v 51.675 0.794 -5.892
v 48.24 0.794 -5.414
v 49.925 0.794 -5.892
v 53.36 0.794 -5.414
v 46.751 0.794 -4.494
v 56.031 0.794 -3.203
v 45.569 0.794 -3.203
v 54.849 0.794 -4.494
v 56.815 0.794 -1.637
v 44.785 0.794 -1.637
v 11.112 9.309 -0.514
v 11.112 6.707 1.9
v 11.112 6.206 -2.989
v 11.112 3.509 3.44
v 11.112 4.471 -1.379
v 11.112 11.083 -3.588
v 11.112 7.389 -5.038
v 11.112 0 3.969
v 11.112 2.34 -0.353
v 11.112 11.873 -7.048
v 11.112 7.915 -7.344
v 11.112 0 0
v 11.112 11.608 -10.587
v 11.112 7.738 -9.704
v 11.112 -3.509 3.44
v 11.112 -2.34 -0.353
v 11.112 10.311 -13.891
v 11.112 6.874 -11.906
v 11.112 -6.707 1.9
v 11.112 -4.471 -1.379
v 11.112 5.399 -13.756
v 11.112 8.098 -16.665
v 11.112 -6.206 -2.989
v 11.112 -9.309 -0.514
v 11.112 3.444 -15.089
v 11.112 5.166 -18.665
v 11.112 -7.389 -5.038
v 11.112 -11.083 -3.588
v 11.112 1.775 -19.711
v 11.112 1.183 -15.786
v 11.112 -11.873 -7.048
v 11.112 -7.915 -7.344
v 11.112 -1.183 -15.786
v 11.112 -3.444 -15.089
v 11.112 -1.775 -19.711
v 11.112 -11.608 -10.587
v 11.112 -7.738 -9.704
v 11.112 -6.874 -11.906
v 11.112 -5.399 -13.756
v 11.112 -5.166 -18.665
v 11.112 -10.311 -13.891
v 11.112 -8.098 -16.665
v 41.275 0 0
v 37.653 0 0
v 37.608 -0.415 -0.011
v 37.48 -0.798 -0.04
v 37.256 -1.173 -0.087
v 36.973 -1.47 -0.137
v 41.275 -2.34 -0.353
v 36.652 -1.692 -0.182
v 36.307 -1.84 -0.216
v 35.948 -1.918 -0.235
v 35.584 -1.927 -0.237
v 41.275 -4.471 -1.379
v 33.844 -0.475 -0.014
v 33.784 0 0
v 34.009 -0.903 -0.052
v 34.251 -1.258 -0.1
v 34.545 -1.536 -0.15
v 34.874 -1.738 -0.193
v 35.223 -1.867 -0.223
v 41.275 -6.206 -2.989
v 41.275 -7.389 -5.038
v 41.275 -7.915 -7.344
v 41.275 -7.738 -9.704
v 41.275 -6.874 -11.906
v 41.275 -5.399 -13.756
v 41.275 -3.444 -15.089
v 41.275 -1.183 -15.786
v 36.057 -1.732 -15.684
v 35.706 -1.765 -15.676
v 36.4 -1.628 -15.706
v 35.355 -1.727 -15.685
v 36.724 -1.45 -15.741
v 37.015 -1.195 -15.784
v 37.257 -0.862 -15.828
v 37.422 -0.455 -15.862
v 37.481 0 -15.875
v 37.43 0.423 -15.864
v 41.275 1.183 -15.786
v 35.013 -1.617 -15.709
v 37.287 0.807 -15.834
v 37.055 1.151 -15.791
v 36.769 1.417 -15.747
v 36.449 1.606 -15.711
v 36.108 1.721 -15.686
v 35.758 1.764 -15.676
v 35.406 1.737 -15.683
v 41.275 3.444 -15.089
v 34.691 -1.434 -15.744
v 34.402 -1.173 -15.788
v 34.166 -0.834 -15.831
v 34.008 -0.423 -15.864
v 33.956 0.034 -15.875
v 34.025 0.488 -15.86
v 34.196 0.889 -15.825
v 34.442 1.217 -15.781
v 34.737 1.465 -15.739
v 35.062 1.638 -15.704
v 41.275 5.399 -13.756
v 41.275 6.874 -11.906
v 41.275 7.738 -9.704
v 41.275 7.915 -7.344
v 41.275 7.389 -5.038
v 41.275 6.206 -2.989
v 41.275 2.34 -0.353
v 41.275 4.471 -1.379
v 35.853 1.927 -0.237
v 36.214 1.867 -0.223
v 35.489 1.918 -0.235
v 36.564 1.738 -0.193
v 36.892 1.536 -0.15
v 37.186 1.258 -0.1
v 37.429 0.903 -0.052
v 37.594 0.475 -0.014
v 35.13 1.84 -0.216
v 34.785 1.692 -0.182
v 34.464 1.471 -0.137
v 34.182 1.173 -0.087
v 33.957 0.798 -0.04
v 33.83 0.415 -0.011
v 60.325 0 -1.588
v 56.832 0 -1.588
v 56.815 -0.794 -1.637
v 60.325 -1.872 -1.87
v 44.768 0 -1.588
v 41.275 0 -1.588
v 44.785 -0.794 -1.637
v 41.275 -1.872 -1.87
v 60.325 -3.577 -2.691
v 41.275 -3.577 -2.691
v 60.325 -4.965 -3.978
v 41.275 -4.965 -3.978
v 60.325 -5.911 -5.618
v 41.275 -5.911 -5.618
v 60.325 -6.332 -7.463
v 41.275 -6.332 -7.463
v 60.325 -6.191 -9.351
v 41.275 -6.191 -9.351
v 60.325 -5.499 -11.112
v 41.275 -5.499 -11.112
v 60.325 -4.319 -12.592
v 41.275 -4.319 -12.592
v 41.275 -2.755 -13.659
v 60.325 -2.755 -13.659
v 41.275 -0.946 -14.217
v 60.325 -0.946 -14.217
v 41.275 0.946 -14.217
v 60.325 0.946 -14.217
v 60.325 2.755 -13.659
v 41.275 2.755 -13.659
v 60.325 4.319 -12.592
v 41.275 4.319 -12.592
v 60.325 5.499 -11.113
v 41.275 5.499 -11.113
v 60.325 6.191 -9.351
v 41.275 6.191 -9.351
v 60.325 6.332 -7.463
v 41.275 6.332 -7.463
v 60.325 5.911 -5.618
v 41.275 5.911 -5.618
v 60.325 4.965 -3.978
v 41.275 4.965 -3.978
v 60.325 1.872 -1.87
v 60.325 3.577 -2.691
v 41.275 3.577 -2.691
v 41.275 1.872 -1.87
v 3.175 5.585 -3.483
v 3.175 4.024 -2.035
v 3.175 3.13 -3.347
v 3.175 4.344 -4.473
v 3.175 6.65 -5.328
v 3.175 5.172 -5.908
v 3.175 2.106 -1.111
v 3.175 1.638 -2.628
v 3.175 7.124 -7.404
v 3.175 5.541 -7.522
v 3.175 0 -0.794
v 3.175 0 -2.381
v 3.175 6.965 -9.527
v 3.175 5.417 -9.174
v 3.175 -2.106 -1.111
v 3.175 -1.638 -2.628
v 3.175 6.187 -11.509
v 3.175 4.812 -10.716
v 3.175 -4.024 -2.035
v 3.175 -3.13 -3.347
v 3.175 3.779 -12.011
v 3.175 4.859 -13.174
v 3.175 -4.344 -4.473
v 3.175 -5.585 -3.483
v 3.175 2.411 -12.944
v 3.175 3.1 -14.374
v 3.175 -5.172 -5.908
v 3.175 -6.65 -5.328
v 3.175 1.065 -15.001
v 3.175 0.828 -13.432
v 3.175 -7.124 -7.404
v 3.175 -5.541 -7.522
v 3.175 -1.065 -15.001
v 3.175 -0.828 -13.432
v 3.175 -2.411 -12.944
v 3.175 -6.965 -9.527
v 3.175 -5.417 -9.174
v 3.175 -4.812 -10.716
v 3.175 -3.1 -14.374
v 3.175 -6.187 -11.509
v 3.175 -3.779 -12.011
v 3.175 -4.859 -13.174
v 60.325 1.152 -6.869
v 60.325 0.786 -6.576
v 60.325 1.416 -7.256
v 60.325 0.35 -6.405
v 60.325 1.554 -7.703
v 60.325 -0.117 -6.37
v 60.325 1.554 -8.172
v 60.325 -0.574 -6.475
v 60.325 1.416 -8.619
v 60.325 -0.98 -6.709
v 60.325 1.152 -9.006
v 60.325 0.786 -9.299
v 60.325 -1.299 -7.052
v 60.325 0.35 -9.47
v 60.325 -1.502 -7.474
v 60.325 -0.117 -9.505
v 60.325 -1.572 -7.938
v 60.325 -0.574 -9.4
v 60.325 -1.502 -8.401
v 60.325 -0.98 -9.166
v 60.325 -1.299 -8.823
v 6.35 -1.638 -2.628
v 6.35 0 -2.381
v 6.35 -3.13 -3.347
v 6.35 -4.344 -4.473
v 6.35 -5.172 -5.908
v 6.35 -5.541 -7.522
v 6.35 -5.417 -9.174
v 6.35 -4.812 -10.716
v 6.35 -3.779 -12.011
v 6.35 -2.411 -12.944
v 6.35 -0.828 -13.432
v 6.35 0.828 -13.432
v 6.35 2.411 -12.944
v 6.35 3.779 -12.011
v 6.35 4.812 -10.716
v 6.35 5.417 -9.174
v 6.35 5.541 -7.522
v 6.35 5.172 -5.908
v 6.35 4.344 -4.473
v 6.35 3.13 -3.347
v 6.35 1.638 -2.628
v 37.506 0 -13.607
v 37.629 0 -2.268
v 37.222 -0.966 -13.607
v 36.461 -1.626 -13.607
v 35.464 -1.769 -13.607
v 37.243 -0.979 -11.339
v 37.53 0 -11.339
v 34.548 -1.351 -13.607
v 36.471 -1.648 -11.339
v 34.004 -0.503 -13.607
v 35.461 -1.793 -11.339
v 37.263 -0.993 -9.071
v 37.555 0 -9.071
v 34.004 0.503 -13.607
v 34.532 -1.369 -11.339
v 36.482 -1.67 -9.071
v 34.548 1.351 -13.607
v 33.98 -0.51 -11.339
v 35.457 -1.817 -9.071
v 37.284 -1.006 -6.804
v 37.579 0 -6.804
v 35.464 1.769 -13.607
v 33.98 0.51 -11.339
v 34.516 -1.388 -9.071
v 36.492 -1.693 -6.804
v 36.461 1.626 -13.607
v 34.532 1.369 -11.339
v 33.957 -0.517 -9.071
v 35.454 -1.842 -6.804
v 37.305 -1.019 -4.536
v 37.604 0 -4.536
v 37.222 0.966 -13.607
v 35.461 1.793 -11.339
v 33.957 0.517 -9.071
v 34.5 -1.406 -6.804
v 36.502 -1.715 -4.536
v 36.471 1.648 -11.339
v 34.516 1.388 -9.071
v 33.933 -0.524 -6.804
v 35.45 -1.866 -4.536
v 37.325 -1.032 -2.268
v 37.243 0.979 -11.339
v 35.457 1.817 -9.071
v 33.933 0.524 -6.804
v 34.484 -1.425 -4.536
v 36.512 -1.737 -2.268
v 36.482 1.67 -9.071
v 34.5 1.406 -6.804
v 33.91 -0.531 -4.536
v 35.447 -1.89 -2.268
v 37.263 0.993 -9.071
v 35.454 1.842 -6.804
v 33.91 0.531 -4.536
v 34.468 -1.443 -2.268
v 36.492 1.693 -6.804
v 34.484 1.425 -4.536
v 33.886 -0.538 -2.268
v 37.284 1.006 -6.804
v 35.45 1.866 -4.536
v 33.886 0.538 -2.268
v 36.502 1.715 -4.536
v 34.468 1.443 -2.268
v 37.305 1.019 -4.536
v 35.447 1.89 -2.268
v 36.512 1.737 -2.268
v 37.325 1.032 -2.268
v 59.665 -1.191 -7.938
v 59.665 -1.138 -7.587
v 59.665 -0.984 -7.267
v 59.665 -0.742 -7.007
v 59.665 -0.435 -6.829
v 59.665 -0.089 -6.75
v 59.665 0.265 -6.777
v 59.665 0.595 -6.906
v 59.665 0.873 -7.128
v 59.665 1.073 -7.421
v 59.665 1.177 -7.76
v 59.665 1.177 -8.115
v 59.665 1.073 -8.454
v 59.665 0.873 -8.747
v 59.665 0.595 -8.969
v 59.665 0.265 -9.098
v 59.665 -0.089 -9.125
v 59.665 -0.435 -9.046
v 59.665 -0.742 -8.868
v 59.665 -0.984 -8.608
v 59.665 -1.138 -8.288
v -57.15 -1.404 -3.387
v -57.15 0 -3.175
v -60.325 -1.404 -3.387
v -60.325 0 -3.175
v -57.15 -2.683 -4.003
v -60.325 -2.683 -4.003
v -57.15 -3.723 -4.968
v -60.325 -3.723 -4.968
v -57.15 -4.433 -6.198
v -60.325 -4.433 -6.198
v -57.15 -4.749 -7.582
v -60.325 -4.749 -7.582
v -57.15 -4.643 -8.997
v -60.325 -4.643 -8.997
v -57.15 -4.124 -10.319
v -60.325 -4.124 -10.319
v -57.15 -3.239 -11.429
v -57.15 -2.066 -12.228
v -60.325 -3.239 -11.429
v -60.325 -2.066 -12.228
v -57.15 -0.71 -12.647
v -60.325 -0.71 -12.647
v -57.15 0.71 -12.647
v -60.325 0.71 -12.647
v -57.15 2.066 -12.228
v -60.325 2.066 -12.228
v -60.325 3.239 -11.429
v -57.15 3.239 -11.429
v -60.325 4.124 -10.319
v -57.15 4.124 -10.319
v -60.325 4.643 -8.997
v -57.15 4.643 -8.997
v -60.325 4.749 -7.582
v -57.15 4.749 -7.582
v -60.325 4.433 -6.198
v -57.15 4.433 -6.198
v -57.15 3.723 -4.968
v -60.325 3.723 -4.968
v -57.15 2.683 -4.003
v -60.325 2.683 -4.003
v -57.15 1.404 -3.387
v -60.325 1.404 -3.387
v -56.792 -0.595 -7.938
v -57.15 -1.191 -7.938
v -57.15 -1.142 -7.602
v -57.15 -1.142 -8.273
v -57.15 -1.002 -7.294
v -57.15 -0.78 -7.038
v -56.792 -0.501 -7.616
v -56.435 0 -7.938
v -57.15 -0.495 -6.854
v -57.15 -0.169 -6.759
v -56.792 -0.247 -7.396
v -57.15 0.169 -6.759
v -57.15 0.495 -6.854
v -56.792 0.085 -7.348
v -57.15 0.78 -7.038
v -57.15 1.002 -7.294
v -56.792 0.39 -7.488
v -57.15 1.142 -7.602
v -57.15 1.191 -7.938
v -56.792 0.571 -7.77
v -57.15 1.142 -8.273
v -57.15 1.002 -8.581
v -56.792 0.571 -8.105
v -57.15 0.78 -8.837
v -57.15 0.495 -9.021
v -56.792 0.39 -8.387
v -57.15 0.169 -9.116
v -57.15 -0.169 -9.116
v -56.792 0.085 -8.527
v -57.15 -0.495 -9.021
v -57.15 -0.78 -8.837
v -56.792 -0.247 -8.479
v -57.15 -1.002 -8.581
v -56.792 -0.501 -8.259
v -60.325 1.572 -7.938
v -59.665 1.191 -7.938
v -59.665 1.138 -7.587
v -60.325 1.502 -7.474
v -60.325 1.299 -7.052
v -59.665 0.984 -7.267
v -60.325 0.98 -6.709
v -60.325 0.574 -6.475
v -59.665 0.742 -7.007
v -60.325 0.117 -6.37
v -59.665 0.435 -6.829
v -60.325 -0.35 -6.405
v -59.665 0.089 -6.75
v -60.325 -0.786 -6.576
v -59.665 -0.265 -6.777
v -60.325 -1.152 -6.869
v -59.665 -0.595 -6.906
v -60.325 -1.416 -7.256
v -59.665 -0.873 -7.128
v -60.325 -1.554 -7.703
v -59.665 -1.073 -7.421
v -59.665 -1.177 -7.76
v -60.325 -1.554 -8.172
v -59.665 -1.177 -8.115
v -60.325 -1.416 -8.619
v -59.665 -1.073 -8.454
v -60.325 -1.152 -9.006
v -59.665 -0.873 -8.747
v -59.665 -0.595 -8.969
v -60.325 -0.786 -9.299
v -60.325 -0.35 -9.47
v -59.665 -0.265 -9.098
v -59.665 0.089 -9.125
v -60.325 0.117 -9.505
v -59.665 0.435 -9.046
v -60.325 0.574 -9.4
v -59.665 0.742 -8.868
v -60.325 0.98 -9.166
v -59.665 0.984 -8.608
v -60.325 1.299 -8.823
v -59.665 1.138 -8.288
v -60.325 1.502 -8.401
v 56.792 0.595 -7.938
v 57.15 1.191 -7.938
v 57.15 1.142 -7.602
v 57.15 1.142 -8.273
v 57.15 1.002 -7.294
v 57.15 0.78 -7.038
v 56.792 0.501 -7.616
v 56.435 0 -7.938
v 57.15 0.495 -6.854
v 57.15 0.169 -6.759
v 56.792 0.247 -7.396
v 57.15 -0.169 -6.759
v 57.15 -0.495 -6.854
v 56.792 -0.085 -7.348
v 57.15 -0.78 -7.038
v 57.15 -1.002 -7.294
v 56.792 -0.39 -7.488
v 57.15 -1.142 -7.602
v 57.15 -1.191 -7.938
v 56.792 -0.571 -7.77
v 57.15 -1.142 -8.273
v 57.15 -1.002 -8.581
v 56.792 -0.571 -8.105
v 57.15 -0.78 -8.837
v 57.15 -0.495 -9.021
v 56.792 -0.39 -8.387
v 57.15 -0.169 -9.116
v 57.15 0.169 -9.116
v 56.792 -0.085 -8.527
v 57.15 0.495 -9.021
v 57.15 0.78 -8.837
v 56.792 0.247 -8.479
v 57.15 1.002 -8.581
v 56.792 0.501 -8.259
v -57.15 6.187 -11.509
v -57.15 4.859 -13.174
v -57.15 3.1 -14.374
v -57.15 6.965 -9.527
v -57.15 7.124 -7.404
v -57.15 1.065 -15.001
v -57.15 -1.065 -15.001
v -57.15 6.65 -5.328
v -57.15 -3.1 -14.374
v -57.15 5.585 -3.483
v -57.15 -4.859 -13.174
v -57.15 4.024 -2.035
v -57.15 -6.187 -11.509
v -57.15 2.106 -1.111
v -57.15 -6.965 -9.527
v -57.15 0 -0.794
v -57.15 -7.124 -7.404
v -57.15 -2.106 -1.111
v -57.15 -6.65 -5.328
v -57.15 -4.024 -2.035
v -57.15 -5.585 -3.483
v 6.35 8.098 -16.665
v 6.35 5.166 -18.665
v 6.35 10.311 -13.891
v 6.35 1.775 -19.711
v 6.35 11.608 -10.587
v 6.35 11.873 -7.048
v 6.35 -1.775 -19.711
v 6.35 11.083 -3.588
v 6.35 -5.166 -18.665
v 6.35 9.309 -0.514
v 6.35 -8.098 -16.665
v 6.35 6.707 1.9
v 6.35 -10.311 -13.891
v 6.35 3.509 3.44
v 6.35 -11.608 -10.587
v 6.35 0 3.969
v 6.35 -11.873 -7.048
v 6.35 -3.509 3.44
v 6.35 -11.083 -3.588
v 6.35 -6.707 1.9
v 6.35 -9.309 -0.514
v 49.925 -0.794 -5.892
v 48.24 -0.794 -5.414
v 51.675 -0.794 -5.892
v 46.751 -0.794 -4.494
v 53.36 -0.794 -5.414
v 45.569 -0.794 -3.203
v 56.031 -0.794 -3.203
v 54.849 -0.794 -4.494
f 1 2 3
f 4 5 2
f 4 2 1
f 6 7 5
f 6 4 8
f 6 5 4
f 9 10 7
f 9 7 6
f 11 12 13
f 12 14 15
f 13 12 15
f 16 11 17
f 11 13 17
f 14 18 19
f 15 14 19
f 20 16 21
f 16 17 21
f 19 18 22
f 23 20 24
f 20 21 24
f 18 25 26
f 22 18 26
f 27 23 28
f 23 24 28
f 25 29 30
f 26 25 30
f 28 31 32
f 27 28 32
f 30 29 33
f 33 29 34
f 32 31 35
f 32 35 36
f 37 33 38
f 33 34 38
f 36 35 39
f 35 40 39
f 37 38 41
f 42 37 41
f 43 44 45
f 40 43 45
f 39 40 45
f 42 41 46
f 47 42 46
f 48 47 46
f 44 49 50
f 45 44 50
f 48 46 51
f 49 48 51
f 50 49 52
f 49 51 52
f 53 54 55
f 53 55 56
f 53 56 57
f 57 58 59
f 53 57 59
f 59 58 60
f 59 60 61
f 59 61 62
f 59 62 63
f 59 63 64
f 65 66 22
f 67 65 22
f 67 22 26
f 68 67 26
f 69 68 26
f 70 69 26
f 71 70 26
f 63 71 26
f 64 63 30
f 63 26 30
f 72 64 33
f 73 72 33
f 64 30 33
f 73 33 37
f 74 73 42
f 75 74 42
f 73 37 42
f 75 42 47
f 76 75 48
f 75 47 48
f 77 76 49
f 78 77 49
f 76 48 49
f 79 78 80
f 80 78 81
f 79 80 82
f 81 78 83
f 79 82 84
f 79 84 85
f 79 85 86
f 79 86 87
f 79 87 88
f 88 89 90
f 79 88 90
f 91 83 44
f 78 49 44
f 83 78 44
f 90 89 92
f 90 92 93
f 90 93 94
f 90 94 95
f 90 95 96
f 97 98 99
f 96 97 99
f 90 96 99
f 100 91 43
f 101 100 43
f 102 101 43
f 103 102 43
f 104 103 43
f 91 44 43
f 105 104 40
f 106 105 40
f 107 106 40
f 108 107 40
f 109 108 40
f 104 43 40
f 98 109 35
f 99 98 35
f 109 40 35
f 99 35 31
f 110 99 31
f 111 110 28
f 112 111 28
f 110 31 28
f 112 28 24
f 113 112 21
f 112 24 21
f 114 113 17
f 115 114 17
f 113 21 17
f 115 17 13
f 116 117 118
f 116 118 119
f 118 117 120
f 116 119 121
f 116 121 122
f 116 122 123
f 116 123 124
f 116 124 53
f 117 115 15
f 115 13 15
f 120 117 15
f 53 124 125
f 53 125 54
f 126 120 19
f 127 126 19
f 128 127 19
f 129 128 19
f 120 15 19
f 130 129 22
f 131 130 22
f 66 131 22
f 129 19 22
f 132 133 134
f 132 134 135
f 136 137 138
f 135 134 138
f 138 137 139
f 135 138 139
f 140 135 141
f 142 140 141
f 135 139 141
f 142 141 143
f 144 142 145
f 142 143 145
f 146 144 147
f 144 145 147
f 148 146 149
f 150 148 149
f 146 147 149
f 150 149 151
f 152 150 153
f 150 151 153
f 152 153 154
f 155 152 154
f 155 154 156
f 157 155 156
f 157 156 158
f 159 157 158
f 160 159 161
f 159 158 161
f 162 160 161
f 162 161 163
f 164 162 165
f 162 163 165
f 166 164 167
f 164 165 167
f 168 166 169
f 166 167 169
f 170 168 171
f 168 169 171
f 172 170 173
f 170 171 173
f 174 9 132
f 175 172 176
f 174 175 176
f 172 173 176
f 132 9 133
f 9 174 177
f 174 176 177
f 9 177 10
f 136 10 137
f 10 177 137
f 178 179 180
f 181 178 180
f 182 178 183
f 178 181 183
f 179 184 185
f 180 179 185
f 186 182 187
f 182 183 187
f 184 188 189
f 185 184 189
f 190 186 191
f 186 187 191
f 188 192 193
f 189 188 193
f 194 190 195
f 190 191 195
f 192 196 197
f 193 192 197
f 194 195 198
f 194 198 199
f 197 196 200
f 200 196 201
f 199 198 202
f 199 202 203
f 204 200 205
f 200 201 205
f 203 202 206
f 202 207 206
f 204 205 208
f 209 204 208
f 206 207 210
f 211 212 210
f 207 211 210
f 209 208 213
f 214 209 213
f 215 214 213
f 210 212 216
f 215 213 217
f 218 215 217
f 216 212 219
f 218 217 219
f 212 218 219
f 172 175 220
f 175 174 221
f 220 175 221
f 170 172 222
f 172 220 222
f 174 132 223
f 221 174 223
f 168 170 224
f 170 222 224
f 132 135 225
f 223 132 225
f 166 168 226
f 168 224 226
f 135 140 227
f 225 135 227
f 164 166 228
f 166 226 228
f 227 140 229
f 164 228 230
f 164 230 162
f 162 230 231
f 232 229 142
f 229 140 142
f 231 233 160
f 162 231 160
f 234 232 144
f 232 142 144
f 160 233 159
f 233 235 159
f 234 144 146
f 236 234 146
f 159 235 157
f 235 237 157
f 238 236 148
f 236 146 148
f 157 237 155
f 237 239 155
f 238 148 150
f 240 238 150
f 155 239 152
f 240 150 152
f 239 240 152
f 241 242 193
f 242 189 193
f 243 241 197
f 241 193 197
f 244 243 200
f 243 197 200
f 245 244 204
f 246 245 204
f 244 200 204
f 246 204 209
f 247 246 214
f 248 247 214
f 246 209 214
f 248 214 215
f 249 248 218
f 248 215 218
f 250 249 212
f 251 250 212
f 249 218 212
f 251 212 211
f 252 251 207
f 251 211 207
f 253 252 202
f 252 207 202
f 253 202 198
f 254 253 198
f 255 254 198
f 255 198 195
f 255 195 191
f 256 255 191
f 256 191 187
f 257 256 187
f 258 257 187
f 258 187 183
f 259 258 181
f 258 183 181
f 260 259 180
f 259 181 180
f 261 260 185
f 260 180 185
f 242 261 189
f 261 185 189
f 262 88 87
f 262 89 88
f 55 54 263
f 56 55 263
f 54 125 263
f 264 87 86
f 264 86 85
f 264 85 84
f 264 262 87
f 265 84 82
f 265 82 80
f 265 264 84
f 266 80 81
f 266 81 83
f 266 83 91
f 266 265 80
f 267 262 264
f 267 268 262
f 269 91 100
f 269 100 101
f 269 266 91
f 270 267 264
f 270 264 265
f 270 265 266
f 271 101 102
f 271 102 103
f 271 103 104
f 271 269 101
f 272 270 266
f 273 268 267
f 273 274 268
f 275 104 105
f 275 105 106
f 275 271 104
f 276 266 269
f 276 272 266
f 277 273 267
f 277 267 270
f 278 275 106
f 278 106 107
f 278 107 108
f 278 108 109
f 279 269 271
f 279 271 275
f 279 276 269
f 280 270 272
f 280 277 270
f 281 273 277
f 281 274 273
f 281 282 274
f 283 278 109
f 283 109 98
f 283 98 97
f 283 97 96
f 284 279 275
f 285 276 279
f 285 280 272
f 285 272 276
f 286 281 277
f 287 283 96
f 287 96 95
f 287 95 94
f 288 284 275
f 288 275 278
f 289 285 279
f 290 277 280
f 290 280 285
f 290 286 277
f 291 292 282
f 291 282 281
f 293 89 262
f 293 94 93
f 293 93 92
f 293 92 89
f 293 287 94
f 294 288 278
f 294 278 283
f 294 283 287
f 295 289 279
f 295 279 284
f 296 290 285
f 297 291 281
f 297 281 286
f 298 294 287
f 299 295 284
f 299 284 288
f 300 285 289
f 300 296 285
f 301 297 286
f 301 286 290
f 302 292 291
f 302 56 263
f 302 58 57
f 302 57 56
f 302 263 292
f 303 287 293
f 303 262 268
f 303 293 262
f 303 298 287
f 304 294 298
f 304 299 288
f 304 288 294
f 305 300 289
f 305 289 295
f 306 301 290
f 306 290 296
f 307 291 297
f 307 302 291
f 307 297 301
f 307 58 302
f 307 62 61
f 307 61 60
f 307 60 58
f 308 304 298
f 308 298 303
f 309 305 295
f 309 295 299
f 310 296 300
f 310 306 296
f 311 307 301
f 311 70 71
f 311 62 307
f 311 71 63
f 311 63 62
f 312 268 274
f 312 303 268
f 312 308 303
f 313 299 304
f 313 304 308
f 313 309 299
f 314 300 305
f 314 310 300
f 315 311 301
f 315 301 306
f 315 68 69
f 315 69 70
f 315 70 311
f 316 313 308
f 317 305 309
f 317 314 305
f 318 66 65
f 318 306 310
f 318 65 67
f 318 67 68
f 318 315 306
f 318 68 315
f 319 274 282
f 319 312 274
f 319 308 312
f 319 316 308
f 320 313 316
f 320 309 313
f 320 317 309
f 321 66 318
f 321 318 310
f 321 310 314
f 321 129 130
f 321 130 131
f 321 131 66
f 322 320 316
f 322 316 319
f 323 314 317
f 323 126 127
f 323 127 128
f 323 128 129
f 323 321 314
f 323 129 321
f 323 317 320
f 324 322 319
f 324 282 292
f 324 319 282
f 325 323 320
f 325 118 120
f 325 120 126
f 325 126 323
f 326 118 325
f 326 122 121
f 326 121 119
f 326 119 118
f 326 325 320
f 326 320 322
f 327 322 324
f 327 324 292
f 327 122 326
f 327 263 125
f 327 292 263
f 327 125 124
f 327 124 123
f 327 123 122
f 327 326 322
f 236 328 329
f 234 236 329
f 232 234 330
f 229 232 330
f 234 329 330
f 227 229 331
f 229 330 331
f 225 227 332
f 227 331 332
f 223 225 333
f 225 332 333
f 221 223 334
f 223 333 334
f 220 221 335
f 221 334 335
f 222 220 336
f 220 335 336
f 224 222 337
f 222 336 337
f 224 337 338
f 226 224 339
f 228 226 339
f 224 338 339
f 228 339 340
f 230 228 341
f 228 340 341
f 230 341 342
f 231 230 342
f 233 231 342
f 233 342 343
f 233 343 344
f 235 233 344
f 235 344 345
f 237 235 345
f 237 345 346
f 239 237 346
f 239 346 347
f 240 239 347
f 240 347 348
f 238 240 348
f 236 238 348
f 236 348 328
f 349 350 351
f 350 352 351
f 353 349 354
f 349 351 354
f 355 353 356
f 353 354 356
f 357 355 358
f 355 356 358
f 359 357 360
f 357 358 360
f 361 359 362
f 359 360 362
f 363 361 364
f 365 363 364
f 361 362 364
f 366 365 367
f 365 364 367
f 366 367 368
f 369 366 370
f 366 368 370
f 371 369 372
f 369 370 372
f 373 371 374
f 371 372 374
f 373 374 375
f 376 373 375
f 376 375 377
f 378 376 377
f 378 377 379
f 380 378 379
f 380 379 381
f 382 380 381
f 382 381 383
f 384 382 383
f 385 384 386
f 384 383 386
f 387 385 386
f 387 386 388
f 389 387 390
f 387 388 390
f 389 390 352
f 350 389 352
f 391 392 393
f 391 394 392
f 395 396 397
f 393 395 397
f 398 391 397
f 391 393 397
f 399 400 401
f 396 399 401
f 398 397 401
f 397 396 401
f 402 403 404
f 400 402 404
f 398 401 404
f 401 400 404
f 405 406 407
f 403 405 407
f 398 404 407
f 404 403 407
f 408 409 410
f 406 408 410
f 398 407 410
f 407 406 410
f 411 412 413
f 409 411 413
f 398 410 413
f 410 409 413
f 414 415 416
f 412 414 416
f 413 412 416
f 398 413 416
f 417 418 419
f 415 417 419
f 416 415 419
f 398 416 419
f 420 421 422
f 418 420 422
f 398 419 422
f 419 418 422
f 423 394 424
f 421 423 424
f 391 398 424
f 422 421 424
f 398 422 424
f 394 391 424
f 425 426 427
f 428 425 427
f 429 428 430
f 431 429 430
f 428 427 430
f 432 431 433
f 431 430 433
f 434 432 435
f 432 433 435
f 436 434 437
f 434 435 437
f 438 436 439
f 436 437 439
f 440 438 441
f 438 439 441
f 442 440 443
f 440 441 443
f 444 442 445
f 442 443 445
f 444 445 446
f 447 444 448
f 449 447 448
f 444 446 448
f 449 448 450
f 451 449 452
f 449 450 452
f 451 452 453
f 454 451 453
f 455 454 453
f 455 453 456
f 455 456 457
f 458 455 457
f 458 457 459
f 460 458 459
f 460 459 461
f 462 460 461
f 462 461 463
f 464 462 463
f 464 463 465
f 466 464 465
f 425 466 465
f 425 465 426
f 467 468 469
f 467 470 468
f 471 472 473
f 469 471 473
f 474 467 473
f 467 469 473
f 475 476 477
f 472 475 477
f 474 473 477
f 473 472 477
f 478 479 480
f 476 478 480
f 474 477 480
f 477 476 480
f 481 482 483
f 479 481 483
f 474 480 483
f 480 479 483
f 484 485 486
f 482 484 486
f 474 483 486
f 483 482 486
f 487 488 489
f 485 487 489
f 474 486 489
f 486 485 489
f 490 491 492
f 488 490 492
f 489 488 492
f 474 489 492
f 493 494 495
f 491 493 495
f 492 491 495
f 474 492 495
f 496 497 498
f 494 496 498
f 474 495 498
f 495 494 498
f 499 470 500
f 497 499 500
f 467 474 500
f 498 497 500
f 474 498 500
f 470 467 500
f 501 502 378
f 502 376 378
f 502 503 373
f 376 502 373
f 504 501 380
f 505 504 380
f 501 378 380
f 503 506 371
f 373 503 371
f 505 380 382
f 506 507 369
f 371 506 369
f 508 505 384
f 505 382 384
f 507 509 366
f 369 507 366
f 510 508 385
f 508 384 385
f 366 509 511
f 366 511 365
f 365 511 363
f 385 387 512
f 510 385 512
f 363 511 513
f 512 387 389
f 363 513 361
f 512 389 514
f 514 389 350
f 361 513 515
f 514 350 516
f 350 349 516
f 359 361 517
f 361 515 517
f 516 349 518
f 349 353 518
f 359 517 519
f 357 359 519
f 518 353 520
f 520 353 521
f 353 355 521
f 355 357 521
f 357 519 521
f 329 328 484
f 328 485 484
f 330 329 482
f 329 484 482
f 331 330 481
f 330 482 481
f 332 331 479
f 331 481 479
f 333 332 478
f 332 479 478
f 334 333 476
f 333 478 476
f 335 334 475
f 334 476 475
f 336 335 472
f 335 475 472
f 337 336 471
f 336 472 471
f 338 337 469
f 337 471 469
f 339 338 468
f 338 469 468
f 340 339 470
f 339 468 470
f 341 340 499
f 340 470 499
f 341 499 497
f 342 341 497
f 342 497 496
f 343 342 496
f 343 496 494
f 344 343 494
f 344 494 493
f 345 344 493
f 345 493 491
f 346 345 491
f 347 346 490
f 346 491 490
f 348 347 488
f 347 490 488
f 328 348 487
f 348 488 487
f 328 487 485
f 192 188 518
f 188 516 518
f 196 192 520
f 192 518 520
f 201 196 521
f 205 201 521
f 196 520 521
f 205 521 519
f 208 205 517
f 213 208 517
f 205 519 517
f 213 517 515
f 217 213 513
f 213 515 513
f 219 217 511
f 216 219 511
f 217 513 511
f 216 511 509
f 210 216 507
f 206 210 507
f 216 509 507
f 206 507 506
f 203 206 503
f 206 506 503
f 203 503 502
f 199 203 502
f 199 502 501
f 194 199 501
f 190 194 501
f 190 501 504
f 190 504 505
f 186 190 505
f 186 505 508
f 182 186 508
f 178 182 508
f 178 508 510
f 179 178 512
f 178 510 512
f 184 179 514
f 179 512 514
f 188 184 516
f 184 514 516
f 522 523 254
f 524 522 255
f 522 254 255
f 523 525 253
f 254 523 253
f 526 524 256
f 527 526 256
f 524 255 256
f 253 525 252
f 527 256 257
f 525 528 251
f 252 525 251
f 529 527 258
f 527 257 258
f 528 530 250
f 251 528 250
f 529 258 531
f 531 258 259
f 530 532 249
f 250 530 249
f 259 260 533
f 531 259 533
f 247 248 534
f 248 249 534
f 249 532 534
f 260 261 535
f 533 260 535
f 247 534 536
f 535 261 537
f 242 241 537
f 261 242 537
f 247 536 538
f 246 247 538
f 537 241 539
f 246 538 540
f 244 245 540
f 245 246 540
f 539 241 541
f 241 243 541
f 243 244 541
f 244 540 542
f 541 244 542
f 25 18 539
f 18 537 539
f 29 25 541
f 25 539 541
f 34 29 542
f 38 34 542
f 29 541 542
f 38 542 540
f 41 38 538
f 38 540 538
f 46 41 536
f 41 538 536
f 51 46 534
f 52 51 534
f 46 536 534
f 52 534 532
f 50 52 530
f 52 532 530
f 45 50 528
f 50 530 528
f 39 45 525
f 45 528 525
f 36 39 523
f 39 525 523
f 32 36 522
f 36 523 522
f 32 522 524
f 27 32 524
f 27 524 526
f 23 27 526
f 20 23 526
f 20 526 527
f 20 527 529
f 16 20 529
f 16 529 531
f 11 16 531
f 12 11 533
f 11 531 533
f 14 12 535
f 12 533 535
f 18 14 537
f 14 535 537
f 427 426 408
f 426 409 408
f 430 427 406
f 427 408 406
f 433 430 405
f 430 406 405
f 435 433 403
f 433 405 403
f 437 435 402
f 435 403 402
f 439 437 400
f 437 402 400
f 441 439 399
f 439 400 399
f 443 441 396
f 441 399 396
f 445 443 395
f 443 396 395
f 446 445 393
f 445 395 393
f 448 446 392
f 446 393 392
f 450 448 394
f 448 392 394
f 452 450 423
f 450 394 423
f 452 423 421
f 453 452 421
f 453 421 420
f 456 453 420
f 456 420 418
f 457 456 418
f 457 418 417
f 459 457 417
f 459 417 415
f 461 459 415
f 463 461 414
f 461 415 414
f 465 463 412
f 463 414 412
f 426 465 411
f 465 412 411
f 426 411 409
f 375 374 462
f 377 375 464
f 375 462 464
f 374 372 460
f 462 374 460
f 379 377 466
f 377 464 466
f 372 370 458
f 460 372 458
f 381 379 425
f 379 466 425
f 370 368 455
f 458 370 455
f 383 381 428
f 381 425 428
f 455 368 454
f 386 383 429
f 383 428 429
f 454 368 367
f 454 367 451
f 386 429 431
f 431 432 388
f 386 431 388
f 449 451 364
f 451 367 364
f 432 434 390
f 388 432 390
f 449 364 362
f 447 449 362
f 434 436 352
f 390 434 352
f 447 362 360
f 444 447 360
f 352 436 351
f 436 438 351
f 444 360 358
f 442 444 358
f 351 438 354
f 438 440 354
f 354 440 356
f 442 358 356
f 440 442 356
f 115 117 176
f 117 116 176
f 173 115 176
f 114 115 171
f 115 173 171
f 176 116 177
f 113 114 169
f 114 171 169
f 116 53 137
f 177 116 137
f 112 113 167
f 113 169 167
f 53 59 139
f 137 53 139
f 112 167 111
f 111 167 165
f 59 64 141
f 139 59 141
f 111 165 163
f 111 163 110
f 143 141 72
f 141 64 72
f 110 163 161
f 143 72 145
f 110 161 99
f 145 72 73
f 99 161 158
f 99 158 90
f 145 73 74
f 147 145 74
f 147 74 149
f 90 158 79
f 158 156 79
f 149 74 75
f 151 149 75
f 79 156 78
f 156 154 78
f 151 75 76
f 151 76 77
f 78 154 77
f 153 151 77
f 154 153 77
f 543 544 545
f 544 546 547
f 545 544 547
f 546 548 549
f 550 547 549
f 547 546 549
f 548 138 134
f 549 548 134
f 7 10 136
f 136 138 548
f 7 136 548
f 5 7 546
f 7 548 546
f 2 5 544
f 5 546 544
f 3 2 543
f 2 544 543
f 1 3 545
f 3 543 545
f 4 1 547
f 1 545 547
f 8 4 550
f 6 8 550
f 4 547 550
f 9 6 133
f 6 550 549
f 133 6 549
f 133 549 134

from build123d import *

# Parameters (mm, degrees)
F1_R                 = 6.35
F6_DEPTH             = 0.79375
F4_D                 = 2.38125
F4_DEPTH             = 3.175
F4_CSINK_D           = 3.14325
F4_CSINK_ANGLE       = 60
F4_TIP               = 0.7153996745
F4_ON_F8_D           = 2.38125
F4_ON_F8_DEPTH       = 3.175
F4_ON_F8_CSINK_D     = 3.14325
F4_ON_F8_CSINK_ANGLE = 60
F4_ON_F8_TIP         = 0.7153996745


with BuildPart() as f0:
    # F5 (on Front) → F0 (revolve)
    with BuildSketch(Plane.XZ):
        Polygon((-60.325, -3.175), (-60.325, -7.9375), (60.325, -7.9375), (60.325, -1.5875), (41.275, -1.5875), (41.275, 0), (11.1125, 0), (11.1125, 3.96875), (6.35, 3.96875), (6.35, -2.38125), (3.175, -2.38125), (3.175, -0.79375), (-57.15, -0.79375), (-57.15, -3.175), align=None)
    revolve(axis=Axis((0, 0, -7.9375), (1, 0, 0)))

    # F1 (on Front) → F6 (cut, symmetric)
    with BuildSketch(Plane.XZ):
        with Locations((50.8, 0.396875)):
            Circle(F1_R)
    extrude(amount=F6_DEPTH, both=True, mode=Mode.SUBTRACT)

    # F2 (on Front) → F7 (revolve, cut)
    with BuildSketch(Plane.XZ):
        with BuildLine():
            Line((37.43325, -20.3236020014), (37.69995, 4.3383559637))
            ThreePointArc((37.69995, 4.3383559637), (36.7317963469, 4.6552760961), (35.71875, 4.7625))
            Line((35.71875, 4.7625), (35.71875, -20.6375))
            ThreePointArc((35.71875, -20.6375), (36.5902490252, -20.5583786828), (37.43325, -20.3236020014))
        make_face()
    revolve(axis=Axis((35.71875, 0, 0), (0, 0, -1)), mode=Mode.SUBTRACT)

    # F4
    with Locations(Plane.YZ.offset(60.325)):
        with Locations((0, -7.9375)):
            CounterSinkHole(F4_D / 2, F4_CSINK_D / 2, depth=F4_DEPTH, counter_sink_angle=F4_CSINK_ANGLE)
            with Locations((0, 0, -(F4_DEPTH + F4_TIP / 2))):  # 118° drill point
                Cone(0, F4_D / 2, F4_TIP, mode=Mode.SUBTRACT)

    # F4 on F8
    with Locations(Plane(origin=(-60.325, 0, 0), x_dir=(0, -1, 0), z_dir=(-1, 0, 0))):
        with Locations((0, -7.9375)):
            CounterSinkHole(F4_ON_F8_D / 2, F4_ON_F8_CSINK_D / 2, depth=F4_ON_F8_DEPTH, counter_sink_angle=F4_ON_F8_CSINK_ANGLE)
            with Locations((0, 0, -(F4_ON_F8_DEPTH + F4_ON_F8_TIP / 2))):  # 118° drill point
                Cone(0, F4_ON_F8_D / 2, F4_ON_F8_TIP, mode=Mode.SUBTRACT)


solid = f0.part
